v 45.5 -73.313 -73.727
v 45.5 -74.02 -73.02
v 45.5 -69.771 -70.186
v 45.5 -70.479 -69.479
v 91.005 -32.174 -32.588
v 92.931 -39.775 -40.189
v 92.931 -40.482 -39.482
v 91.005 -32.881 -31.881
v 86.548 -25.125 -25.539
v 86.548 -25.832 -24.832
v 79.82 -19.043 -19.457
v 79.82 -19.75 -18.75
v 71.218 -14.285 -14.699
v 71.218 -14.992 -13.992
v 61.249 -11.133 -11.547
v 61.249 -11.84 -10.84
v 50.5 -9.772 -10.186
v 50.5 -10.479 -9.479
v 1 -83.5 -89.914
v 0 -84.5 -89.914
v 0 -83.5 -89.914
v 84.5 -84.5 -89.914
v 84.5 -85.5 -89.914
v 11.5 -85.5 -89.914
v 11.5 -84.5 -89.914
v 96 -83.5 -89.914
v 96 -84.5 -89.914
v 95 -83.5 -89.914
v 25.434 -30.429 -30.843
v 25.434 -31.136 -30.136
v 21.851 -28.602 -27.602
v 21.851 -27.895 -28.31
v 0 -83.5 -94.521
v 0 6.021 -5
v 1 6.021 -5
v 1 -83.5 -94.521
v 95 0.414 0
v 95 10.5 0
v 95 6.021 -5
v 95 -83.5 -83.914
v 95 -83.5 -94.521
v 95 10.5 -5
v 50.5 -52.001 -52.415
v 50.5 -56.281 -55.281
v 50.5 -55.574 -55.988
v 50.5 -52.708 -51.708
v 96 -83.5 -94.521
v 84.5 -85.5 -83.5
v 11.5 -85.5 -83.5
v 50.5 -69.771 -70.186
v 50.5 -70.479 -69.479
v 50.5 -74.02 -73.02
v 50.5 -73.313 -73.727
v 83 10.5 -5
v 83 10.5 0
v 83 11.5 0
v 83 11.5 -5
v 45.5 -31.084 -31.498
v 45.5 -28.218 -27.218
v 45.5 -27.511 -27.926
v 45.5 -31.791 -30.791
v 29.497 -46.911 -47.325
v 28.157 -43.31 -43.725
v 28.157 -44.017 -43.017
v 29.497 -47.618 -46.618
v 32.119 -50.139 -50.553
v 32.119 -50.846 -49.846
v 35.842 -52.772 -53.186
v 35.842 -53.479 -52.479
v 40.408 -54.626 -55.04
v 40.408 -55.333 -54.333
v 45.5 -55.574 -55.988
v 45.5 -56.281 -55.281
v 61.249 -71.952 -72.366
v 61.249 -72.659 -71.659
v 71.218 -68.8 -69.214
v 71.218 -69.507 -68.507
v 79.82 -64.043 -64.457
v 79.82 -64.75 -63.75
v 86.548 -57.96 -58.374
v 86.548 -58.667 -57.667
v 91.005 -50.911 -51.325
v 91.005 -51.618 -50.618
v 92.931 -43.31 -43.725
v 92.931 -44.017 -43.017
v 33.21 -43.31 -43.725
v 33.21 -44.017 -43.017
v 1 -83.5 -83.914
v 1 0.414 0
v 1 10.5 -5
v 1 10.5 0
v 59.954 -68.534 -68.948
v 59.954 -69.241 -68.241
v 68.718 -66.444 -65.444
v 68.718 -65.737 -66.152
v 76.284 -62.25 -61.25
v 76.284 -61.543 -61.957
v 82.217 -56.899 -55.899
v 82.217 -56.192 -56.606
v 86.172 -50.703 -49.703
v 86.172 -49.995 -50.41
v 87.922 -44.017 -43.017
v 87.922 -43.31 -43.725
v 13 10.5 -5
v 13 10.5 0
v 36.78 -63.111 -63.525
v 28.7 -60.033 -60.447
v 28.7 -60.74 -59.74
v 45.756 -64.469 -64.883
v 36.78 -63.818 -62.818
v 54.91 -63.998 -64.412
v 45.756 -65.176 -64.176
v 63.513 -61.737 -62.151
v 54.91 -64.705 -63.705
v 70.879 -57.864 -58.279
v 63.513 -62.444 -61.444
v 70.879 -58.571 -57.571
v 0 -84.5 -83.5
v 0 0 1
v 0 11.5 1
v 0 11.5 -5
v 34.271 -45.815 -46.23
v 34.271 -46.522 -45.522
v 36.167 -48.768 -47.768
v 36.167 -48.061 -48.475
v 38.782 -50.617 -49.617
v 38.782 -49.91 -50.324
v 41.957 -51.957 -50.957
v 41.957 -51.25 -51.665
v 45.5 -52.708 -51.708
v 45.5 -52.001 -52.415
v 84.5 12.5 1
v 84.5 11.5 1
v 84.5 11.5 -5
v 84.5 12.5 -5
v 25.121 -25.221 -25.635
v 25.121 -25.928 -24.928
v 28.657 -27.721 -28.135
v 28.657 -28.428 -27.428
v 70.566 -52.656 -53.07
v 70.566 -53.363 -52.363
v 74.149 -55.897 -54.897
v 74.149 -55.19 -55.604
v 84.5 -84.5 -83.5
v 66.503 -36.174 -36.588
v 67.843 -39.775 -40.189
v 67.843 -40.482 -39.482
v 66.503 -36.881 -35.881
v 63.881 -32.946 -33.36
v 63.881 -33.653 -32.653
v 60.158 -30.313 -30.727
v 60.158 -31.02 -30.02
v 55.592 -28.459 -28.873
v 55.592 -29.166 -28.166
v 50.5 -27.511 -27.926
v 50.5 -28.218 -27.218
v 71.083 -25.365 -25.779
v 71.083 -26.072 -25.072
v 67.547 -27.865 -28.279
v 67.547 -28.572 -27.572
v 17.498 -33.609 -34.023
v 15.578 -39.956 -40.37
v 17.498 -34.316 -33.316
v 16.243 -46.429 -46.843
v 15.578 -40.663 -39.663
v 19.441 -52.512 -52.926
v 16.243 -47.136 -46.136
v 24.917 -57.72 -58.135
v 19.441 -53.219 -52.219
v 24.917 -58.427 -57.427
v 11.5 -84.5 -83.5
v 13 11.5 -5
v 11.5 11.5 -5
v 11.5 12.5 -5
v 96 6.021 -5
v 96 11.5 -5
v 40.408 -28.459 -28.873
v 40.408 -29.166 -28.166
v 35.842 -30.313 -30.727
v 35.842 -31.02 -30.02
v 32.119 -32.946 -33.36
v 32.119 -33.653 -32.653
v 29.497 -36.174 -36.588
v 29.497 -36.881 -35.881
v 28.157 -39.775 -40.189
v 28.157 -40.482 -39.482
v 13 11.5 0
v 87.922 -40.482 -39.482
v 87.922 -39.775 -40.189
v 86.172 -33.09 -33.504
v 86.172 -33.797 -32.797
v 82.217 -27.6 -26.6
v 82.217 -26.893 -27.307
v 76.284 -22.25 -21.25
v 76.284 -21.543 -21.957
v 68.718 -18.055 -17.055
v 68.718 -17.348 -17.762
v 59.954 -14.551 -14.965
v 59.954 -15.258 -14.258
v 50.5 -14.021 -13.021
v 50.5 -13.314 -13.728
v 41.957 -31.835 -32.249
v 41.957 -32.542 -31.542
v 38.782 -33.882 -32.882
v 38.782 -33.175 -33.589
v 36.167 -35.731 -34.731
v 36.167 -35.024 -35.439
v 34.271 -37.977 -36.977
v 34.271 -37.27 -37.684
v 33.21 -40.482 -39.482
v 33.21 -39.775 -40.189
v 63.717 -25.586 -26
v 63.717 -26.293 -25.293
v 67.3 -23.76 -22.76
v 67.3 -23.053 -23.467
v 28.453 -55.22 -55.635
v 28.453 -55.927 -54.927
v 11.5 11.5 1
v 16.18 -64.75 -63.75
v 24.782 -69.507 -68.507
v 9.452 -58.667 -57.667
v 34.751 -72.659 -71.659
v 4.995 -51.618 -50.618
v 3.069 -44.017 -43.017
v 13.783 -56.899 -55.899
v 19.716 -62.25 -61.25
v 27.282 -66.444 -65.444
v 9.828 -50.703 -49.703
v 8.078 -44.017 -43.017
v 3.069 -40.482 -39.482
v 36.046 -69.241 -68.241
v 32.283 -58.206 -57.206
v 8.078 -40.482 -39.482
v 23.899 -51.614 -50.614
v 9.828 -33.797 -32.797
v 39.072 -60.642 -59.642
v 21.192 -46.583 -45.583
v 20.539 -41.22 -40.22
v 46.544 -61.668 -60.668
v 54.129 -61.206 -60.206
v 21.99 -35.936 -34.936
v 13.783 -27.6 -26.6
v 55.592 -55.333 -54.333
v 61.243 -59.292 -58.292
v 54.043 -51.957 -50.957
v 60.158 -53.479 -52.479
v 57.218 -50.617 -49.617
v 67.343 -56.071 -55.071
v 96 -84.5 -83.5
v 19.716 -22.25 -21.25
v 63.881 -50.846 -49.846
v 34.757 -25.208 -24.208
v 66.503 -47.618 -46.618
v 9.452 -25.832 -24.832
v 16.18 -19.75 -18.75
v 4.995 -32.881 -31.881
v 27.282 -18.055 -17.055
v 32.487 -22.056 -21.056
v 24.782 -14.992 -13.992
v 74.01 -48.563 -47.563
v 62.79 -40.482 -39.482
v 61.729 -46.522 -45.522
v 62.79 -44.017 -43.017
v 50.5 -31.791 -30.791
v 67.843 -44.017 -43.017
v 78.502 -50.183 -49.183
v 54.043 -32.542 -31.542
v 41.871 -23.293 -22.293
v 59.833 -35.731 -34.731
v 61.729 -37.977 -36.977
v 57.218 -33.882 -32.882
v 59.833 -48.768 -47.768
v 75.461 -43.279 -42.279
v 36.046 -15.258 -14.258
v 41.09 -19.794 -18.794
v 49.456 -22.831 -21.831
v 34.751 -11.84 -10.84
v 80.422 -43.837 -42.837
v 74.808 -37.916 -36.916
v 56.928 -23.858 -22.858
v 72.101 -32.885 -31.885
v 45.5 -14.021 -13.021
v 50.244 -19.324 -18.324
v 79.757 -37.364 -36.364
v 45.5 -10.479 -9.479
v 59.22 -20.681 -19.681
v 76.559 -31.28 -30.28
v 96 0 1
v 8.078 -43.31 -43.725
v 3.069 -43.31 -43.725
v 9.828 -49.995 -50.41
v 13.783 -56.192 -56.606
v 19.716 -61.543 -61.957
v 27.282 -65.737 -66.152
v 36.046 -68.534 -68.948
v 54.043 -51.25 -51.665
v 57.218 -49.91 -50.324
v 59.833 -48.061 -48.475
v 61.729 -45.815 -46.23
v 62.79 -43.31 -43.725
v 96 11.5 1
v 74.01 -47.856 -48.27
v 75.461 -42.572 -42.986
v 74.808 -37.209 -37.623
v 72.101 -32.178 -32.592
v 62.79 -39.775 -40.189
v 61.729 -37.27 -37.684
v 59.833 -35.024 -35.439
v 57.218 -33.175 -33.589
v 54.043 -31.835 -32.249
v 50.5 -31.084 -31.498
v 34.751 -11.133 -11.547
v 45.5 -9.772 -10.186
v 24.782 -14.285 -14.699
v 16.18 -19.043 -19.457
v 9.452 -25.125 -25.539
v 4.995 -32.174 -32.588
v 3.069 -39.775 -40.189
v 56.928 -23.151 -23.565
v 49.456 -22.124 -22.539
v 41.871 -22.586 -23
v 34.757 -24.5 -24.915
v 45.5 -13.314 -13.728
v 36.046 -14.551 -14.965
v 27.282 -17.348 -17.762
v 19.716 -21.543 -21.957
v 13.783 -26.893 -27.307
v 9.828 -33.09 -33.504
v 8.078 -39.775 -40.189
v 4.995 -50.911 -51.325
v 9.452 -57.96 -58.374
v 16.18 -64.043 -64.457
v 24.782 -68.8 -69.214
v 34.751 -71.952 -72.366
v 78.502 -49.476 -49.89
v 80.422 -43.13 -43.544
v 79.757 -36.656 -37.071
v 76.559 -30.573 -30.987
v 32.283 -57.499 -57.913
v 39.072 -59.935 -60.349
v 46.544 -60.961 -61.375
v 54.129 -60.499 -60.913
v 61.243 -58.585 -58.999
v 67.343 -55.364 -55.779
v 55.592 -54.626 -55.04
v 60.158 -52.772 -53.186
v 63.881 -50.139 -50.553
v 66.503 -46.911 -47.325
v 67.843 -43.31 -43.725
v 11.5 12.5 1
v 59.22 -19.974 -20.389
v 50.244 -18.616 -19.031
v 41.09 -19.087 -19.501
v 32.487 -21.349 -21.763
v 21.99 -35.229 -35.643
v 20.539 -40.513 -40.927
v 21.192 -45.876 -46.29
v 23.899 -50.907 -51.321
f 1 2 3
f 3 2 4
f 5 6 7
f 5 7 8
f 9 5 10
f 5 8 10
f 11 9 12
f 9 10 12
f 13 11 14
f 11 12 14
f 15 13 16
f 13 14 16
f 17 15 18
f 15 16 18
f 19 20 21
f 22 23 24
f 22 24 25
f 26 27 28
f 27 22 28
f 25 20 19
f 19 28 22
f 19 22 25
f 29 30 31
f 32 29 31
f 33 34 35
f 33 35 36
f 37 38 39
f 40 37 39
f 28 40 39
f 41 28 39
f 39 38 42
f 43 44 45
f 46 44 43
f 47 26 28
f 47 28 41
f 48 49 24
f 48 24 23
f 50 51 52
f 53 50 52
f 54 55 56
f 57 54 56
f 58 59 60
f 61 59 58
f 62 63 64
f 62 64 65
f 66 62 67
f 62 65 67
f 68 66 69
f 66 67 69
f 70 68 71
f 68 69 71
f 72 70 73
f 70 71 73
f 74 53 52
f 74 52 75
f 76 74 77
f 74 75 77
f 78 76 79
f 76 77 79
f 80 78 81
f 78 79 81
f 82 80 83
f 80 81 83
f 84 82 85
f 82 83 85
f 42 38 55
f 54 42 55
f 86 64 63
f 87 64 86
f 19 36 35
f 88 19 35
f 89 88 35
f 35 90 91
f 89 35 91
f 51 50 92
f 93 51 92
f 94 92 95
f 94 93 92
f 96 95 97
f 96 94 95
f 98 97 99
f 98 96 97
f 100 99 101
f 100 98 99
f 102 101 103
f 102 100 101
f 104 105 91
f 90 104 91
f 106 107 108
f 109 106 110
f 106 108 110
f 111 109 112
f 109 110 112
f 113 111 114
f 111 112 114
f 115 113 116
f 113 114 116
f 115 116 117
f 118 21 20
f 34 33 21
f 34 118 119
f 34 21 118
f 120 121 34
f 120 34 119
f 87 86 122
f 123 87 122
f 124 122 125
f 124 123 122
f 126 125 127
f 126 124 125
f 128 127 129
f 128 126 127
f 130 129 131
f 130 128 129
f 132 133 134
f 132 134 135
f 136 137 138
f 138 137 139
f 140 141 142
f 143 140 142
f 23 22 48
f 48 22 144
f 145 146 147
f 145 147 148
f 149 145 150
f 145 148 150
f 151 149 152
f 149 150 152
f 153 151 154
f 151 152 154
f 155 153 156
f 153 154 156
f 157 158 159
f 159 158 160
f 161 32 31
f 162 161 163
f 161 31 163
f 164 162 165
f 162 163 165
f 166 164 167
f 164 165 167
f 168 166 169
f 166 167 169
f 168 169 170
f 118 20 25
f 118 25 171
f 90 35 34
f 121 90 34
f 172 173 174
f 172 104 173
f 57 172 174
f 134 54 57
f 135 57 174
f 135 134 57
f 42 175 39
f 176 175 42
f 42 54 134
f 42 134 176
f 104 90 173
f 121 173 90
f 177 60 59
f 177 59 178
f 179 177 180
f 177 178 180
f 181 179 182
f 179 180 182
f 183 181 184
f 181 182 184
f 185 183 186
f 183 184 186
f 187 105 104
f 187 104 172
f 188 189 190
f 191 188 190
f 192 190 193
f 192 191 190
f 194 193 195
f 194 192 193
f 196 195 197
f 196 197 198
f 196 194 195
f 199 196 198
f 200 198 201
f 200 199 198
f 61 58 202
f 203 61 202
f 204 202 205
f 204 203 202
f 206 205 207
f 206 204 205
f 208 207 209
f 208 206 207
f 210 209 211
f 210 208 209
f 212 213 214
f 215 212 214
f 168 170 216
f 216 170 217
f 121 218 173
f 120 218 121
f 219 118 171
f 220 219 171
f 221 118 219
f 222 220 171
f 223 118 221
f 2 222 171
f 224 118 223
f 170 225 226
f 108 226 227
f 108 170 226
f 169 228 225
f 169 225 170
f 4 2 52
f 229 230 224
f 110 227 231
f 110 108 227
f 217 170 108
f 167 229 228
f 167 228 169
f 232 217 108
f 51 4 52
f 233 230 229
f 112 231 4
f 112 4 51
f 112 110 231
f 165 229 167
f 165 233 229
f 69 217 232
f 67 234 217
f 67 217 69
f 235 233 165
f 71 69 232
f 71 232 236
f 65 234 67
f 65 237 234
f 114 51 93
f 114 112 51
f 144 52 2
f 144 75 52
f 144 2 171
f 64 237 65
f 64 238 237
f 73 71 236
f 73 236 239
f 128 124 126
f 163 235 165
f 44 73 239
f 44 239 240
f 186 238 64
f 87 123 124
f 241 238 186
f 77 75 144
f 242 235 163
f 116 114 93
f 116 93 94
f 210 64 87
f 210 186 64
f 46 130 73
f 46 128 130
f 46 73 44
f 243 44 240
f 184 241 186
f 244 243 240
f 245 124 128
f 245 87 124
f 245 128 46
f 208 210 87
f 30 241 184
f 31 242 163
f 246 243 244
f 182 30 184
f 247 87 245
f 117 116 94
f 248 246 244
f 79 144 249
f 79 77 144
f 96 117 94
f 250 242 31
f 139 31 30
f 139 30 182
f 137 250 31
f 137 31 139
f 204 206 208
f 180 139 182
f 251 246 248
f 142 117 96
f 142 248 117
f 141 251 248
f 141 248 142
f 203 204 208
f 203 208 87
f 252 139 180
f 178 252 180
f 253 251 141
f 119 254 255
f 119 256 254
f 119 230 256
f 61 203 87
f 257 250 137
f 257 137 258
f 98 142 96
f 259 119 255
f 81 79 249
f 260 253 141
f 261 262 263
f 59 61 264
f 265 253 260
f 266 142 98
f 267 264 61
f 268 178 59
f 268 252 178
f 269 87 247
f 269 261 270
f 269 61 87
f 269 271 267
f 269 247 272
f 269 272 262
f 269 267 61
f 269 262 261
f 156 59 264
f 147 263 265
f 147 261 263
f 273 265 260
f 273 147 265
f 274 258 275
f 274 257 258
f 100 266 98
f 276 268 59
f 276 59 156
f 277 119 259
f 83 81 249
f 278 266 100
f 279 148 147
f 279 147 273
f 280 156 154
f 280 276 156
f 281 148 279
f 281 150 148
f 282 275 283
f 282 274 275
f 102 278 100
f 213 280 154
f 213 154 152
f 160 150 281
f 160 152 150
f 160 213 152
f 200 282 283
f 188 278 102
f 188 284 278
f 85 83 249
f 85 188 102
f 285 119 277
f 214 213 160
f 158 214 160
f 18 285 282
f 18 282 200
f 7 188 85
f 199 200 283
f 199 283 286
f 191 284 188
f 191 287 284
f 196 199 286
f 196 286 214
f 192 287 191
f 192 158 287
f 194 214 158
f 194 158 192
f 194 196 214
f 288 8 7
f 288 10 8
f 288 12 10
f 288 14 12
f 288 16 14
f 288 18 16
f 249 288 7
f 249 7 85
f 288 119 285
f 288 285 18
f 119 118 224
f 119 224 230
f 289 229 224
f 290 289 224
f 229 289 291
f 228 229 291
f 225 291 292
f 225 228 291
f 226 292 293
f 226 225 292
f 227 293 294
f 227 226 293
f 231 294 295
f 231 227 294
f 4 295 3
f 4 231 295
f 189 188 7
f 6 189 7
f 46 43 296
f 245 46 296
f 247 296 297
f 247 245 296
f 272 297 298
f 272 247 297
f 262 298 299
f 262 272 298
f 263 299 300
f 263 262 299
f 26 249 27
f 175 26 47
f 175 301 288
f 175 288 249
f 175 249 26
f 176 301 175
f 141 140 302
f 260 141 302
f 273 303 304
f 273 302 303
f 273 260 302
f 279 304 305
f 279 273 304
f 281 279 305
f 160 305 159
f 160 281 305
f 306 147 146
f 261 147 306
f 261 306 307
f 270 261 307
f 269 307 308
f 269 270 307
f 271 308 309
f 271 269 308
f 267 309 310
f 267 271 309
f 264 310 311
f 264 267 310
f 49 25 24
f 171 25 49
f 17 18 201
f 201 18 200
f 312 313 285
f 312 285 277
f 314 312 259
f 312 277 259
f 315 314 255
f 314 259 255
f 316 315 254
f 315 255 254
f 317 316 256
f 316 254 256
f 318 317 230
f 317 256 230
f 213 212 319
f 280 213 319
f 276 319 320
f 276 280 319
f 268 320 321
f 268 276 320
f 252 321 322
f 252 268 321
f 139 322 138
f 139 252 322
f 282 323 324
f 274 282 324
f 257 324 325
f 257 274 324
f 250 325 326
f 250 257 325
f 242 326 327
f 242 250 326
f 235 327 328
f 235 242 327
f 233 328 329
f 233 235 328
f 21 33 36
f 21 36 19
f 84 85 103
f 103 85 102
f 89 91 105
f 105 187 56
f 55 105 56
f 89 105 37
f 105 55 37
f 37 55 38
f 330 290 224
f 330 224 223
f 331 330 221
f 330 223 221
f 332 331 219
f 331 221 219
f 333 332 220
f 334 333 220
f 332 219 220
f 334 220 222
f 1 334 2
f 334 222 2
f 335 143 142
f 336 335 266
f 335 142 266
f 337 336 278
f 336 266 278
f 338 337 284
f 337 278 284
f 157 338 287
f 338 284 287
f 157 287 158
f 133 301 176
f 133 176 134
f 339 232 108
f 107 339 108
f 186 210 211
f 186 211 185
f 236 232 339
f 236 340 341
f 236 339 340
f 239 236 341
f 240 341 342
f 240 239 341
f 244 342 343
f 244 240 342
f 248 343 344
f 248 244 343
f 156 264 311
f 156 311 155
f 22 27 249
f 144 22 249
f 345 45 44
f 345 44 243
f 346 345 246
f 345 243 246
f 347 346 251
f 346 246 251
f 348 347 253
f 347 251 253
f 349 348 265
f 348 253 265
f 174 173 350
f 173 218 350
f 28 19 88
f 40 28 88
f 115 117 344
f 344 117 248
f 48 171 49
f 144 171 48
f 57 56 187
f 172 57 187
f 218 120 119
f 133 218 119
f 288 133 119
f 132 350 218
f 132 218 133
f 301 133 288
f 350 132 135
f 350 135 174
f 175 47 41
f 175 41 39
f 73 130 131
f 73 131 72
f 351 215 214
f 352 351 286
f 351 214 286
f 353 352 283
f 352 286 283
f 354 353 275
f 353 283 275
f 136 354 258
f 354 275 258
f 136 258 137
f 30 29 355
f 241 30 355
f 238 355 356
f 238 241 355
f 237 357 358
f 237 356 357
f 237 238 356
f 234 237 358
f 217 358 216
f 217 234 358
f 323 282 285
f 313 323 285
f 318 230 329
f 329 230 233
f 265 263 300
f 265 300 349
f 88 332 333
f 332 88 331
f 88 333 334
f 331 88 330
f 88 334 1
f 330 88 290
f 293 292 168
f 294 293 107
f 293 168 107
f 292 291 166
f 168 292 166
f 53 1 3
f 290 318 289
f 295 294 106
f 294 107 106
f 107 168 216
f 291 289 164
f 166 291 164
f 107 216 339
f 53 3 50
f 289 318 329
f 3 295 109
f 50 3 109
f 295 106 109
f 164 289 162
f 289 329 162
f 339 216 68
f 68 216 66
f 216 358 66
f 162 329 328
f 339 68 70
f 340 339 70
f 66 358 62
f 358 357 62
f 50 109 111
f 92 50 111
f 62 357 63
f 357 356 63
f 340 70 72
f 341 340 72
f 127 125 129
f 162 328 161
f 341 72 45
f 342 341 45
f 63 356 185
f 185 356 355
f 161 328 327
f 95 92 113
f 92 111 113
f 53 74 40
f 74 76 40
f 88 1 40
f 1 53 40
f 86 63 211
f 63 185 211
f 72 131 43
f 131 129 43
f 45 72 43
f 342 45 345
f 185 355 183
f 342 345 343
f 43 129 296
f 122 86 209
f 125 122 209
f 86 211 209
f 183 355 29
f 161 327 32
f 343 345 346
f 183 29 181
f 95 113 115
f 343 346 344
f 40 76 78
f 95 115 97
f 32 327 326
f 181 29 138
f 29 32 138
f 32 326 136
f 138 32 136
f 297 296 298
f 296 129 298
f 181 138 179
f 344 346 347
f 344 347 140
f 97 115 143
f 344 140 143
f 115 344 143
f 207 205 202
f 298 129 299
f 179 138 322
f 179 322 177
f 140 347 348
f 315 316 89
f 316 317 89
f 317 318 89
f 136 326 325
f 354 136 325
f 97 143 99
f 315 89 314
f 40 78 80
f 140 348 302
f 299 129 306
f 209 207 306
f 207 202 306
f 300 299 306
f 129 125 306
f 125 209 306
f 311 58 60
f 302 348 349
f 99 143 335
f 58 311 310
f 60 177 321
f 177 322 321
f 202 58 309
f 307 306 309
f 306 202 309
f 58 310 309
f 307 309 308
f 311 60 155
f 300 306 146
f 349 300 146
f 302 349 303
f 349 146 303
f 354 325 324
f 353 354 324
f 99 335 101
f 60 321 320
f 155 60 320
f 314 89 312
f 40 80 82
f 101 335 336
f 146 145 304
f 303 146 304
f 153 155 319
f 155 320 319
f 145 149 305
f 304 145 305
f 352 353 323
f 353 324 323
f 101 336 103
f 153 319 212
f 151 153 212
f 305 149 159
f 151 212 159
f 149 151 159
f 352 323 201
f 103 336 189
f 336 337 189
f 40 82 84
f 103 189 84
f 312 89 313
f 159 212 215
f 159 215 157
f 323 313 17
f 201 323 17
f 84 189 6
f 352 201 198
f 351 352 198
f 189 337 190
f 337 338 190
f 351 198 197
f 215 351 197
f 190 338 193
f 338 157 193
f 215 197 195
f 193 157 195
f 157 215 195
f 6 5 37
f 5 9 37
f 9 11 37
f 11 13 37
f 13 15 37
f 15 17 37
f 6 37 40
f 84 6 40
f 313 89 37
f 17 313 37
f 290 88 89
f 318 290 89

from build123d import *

# Parameters (mm, degrees)
SKETCH1_W            = 96
SKETCH1_H            = 11.5
BOSS_EXTRUDE1_DEPTH  = 1
BOSS_EXTRUDE2_DEPTH  = 96
SKETCH3_W            = 100.030166713
SKETCH3_H            = 53.267661774
CUT_EXTRUDE1_DEPTH   = 96
SKETCH4_W            = 73
SKETCH4_H            = 1
BOSS_EXTRUDE3_DEPTH  = 1
SKETCH5_W            = 73
SKETCH5_H            = 1
BOSS_EXTRUDE4_DEPTH  = 5
SKETCH6_W            = 13
SKETCH6_H            = 1
BOSS_EXTRUDE6_DEPTH  = 5
SKETCH7_W            = 13
SKETCH7_H            = 1
BOSS_EXTRUDE7_DEPTH  = 5
BOSS_EXTRUDE8_DEPTH  = 96
SKETCH10_W           = 73
SKETCH10_H           = 6.414213562
BOSS_EXTRUDE9_DEPTH  = 1
BOSS_EXTRUDE10_DEPTH = 1
BOSS_EXTRUDE11_DEPTH = 1
SKETCH13_R           = 45
SKETCH13_R_2         = 40
SKETCH13_R_3         = 32.5
SKETCH13_R_4         = 27.5
SKETCH13_R_5         = 20
SKETCH13_R_6         = 15
CUT_EXTRUDE2_DEPTH   = 10
BOSS_EXTRUDE12_DEPTH = 1
CIRPATTERN1_COUNT    = 4
BOSS_EXTRUDE14_DEPTH = 1
CIRPATTERN2_COUNT    = 4
BOSS_EXTRUDE15_DEPTH = 1
CIRPATTERN3_COUNT    = 4


with BuildPart() as part:
    # Sketch1 → Boss-Extrude1 (new body)
    with BuildSketch(Plane.XY):
        with Locations((48, 5.75)):
            Rectangle(SKETCH1_W, SKETCH1_H)
    extrude(amount=BOSS_EXTRUDE1_DEPTH)

    # Sketch2 → Boss-Extrude2 (add)
    with BuildSketch(Plane.ZY):
        Polygon((1, 0), (-86.974134086, -87.974134086), (-87.681240867, -87.267027305), (0, 0.414213562), align=None)
    extrude(amount=-BOSS_EXTRUDE2_DEPTH)

    # Sketch3 → Cut-Extrude1 (cut)
    with BuildSketch(Plane.ZY):
        with Locations((-50.015083356, -111.133830887)):
            Rectangle(SKETCH3_W, SKETCH3_H)
    extrude(amount=-CUT_EXTRUDE1_DEPTH, mode=Mode.SUBTRACT)

    # Sketch4 → Boss-Extrude3 (add)
    with BuildSketch(Plane(origin=(0, 11.5, 0), x_dir=(1, 0, 0), z_dir=(0, 1, 0))):
        with Locations((48, -0.5)):
            Rectangle(SKETCH4_W, SKETCH4_H)
    extrude(amount=BOSS_EXTRUDE3_DEPTH)

    # Sketch5 → Boss-Extrude4 (add)
    with BuildSketch(Plane(origin=(0, 0, 0), x_dir=(-1, 0, 0), z_dir=(0, 0, -1))):
        with Locations((-48, 12)):
            Rectangle(SKETCH5_W, SKETCH5_H)
    extrude(amount=BOSS_EXTRUDE4_DEPTH)

    # Sketch6 → Boss-Extrude6 (add)
    with BuildSketch(Plane(origin=(0, 0, 0), x_dir=(-1, 0, 0), z_dir=(0, 0, -1))):
        with Locations((-6.5, 11)):
            Rectangle(SKETCH6_W, SKETCH6_H)
    extrude(amount=BOSS_EXTRUDE6_DEPTH)

    # Sketch7 → Boss-Extrude7 (add)
    with BuildSketch(Plane(origin=(0, 0, 0), x_dir=(-1, 0, 0), z_dir=(0, 0, -1))):
        with Locations((-89.5, 11)):
            Rectangle(SKETCH7_W, SKETCH7_H)
    extrude(amount=BOSS_EXTRUDE7_DEPTH)

    # Sketch8 → Boss-Extrude8 (add)
    with BuildSketch(Plane(origin=(96, 0, 0), x_dir=(0, 0, -1), z_dir=(1, 0, 0))):
        Polygon((83.5, -84.5), (89.914213562, -84.5), (89.914213562, -83.5), (82.5, -83.5), align=None)
    extrude(amount=-BOSS_EXTRUDE8_DEPTH)

    # Sketch10 → Boss-Extrude9 (add)
    with BuildSketch(Plane.XZ.offset(84.5)):
        with Locations((48, -86.707106781)):
            Rectangle(SKETCH10_W, SKETCH10_H)
    extrude(amount=BOSS_EXTRUDE9_DEPTH)

    # Sketch11 → Boss-Extrude10 (add)
    with BuildSketch(Plane.ZY):
        Polygon((-5, 10.5), (-5, 6.02081528), (-94.52081528, -83.5), (-83.914213562, -83.5), (0, 0.414213562), (0, 10.5), align=None)
    extrude(amount=-BOSS_EXTRUDE10_DEPTH)

    # Sketch12 → Boss-Extrude11 (add)
    with BuildSketch(Plane(origin=(96, 0, 0), x_dir=(0, 0, -1), z_dir=(1, 0, 0))):
        Polygon((5, 10.5), (0, 10.5), (0, 0.414213562), (83.914213562, -83.5), (94.52081528, -83.5), (5, 6.02081528), align=None)
    extrude(amount=-BOSS_EXTRUDE11_DEPTH)

    # Sketch13 → Cut-Extrude2 (cut)
    # profile 1 of 3: a face of its own
    with BuildSketch(Plane(origin=(0, -0.5, 0.5), x_dir=(1, 0, 0), z_dir=(0, -0.7071067811865486, 0.7071067811865465))):
        with Locations(Location((48, -59.042893219, 0), (0, 0, 270))):
            Circle(SKETCH13_R)
        with Locations(Location((48, -59.042893219, 0), (0, 0, 270))):
            Circle(SKETCH13_R_2, mode=Mode.SUBTRACT)
    # profile 2 of 3: a face of its own
    with BuildSketch(Plane(origin=(0, -0.5, 0.5), x_dir=(1, 0, 0), z_dir=(0, -0.7071067811865486, 0.7071067811865465))):
        with Locations(Location((48, -59.042893219, 0), (0, 0, 270))):
            Circle(SKETCH13_R_3)
        with Locations(Location((48, -59.042893219, 0), (0, 0, 270))):
            Circle(SKETCH13_R_4, mode=Mode.SUBTRACT)
    # profile 3 of 3: a face of its own
    with BuildSketch(Plane(origin=(0, -0.5, 0.5), x_dir=(1, 0, 0), z_dir=(0, -0.7071067811865486, 0.7071067811865465))):
        with Locations(Location((48, -59.042893219, 0), (0, 0, 270))):
            Circle(SKETCH13_R_5)
        with Locations(Location((48, -59.042893219, 0), (0, 0, 270))):
            Circle(SKETCH13_R_6, mode=Mode.SUBTRACT)
    extrude(amount=-CUT_EXTRUDE2_DEPTH, mode=Mode.SUBTRACT)


with BuildPart() as cut_extrude2_piece_1:
    # of the separate pieces the step leaves, piece 1, a body of its own (cut_extrude2_pieces)
    add(part.part.solids().sort_by_distance((0, 11.5, 1))[0])



with BuildPart() as cut_extrude2_piece_2:
    # of the separate pieces the step leaves, piece 2, a body of its own (cut_extrude2_pieces)
    add(part.part.solids().sort_by_distance((48, -70.533901423, -69.533901423))[0])


with BuildPart() as cut_extrude2_piece_3:
    # of the separate pieces the step leaves, piece 3, a body of its own (cut_extrude2_pieces)
    add(part.part.solids().sort_by_distance((48, -61.695066659, -60.695066659))[0])



with BuildPart() as cut_extrude2_piece_4:
    # of the separate pieces the step leaves, piece 4, a body of its own (cut_extrude2_pieces)
    add(part.part.solids().sort_by_distance((48, -52.856231894, -51.856231894))[0])


with BuildPart() as cut_extrude2_piece_1_1:
    add(cut_extrude2_piece_1.part)

    add(cut_extrude2_piece_2.part)  # Boss-Extrude12 merges Cut-Extrude2 piece 2
    # Sketch14 → Boss-Extrude12 (add)
    with BuildSketch(Plane(origin=(0, -0.5, 0.5), x_dir=(1, 0, 0), z_dir=(0, -0.7071067811865486, 0.7071067811865465))):
        with BuildLine():
            Line((45.5, -103.973395108), (45.5, -98.964691775))
            ThreePointArc((45.5, -98.964691775), (48, -99.042893219), (50.5, -98.964691775))
            Line((50.5, -98.964691775), (50.5, -103.973395108))
            ThreePointArc((50.5, -103.973395108), (48, -104.042893219), (45.5, -103.973395108))
        make_face()
    boss_extrude12 = extrude(amount=-BOSS_EXTRUDE12_DEPTH)

    # CirPattern1: Boss-Extrude12 ×4 about axis
    cirpattern1_axis = Axis((48, -41.749630176, -41.749630176), (0, -0.7071067811865476, 0.7071067811865476))
    for i in range(1, CIRPATTERN1_COUNT):
        add(boss_extrude12.rotate(cirpattern1_axis, i * 360 / CIRPATTERN1_COUNT))



with BuildPart() as cut_extrude2_piece_3_1:
    add(cut_extrude2_piece_3.part)

    add(cut_extrude2_piece_4.part)  # Boss-Extrude14 merges Cut-Extrude2 piece 4
    # Sketch16 → Boss-Extrude14 (add)
    with BuildSketch(Plane(origin=(0, -0.5, 0.5), x_dir=(1, 0, 0), z_dir=(0, -0.7071067811865486, 0.7071067811865465))):
        with BuildLine():
            Line((45.5, -73.833092677), (45.5, -78.886028052))
            ThreePointArc((45.5, -78.886028052), (48, -79.042893219), (50.5, -78.886028052))
            Line((50.5, -78.886028052), (50.5, -73.833092677))
            ThreePointArc((50.5, -73.833092677), (48, -74.042893219), (45.5, -73.833092677))
        make_face()
    boss_extrude14 = extrude(amount=-BOSS_EXTRUDE14_DEPTH)

    # CirPattern2: Boss-Extrude14 ×4 about axis
    cirpattern2_axis = Axis((48, -41.749630176, -41.749630176), (0, -0.7071067811865476, 0.7071067811865476))
    for i in range(1, CIRPATTERN2_COUNT):
        add(boss_extrude14.rotate(cirpattern2_axis, i * 360 / CIRPATTERN2_COUNT))


with BuildPart() as cut_extrude2_piece_1_2:
    add(cut_extrude2_piece_1_1.part)

    add(cut_extrude2_piece_3_1.part)  # Boss-Extrude15 merges Cut-Extrude2 piece 3
    # Sketch17 → Boss-Extrude15 (add)
    with BuildSketch(Plane(origin=(0, -0.5, 0.5), x_dir=(1, 0, 0), z_dir=(0, -0.7071067811865486, 0.7071067811865465))):
        with BuildLine():
            Line((25.434059771, -43.325757934), (21.851195056, -39.742893219))
            ThreePointArc((21.851195056, -39.742893219), (23.413288551, -37.788631996), (25.121081398, -35.960322227))
            Line((25.121081398, -35.960322227), (28.656656321, -39.49589715))
            ThreePointArc((28.656656321, -39.49589715), (26.958042443, -41.337356735), (25.434059771, -43.325757934))
        make_face()
    boss_extrude15 = extrude(amount=-BOSS_EXTRUDE15_DEPTH)

    # CirPattern3: Boss-Extrude15 ×4 about axis
    cirpattern3_axis = Axis((48, -41.749630176, -41.749630176), (0, -0.7071067811865487, 0.7071067811865465))
    for i in range(1, CIRPATTERN3_COUNT):
        add(boss_extrude15.rotate(cirpattern3_axis, i * 360 / CIRPATTERN3_COUNT))


solid = cut_extrude2_piece_1_2.part
